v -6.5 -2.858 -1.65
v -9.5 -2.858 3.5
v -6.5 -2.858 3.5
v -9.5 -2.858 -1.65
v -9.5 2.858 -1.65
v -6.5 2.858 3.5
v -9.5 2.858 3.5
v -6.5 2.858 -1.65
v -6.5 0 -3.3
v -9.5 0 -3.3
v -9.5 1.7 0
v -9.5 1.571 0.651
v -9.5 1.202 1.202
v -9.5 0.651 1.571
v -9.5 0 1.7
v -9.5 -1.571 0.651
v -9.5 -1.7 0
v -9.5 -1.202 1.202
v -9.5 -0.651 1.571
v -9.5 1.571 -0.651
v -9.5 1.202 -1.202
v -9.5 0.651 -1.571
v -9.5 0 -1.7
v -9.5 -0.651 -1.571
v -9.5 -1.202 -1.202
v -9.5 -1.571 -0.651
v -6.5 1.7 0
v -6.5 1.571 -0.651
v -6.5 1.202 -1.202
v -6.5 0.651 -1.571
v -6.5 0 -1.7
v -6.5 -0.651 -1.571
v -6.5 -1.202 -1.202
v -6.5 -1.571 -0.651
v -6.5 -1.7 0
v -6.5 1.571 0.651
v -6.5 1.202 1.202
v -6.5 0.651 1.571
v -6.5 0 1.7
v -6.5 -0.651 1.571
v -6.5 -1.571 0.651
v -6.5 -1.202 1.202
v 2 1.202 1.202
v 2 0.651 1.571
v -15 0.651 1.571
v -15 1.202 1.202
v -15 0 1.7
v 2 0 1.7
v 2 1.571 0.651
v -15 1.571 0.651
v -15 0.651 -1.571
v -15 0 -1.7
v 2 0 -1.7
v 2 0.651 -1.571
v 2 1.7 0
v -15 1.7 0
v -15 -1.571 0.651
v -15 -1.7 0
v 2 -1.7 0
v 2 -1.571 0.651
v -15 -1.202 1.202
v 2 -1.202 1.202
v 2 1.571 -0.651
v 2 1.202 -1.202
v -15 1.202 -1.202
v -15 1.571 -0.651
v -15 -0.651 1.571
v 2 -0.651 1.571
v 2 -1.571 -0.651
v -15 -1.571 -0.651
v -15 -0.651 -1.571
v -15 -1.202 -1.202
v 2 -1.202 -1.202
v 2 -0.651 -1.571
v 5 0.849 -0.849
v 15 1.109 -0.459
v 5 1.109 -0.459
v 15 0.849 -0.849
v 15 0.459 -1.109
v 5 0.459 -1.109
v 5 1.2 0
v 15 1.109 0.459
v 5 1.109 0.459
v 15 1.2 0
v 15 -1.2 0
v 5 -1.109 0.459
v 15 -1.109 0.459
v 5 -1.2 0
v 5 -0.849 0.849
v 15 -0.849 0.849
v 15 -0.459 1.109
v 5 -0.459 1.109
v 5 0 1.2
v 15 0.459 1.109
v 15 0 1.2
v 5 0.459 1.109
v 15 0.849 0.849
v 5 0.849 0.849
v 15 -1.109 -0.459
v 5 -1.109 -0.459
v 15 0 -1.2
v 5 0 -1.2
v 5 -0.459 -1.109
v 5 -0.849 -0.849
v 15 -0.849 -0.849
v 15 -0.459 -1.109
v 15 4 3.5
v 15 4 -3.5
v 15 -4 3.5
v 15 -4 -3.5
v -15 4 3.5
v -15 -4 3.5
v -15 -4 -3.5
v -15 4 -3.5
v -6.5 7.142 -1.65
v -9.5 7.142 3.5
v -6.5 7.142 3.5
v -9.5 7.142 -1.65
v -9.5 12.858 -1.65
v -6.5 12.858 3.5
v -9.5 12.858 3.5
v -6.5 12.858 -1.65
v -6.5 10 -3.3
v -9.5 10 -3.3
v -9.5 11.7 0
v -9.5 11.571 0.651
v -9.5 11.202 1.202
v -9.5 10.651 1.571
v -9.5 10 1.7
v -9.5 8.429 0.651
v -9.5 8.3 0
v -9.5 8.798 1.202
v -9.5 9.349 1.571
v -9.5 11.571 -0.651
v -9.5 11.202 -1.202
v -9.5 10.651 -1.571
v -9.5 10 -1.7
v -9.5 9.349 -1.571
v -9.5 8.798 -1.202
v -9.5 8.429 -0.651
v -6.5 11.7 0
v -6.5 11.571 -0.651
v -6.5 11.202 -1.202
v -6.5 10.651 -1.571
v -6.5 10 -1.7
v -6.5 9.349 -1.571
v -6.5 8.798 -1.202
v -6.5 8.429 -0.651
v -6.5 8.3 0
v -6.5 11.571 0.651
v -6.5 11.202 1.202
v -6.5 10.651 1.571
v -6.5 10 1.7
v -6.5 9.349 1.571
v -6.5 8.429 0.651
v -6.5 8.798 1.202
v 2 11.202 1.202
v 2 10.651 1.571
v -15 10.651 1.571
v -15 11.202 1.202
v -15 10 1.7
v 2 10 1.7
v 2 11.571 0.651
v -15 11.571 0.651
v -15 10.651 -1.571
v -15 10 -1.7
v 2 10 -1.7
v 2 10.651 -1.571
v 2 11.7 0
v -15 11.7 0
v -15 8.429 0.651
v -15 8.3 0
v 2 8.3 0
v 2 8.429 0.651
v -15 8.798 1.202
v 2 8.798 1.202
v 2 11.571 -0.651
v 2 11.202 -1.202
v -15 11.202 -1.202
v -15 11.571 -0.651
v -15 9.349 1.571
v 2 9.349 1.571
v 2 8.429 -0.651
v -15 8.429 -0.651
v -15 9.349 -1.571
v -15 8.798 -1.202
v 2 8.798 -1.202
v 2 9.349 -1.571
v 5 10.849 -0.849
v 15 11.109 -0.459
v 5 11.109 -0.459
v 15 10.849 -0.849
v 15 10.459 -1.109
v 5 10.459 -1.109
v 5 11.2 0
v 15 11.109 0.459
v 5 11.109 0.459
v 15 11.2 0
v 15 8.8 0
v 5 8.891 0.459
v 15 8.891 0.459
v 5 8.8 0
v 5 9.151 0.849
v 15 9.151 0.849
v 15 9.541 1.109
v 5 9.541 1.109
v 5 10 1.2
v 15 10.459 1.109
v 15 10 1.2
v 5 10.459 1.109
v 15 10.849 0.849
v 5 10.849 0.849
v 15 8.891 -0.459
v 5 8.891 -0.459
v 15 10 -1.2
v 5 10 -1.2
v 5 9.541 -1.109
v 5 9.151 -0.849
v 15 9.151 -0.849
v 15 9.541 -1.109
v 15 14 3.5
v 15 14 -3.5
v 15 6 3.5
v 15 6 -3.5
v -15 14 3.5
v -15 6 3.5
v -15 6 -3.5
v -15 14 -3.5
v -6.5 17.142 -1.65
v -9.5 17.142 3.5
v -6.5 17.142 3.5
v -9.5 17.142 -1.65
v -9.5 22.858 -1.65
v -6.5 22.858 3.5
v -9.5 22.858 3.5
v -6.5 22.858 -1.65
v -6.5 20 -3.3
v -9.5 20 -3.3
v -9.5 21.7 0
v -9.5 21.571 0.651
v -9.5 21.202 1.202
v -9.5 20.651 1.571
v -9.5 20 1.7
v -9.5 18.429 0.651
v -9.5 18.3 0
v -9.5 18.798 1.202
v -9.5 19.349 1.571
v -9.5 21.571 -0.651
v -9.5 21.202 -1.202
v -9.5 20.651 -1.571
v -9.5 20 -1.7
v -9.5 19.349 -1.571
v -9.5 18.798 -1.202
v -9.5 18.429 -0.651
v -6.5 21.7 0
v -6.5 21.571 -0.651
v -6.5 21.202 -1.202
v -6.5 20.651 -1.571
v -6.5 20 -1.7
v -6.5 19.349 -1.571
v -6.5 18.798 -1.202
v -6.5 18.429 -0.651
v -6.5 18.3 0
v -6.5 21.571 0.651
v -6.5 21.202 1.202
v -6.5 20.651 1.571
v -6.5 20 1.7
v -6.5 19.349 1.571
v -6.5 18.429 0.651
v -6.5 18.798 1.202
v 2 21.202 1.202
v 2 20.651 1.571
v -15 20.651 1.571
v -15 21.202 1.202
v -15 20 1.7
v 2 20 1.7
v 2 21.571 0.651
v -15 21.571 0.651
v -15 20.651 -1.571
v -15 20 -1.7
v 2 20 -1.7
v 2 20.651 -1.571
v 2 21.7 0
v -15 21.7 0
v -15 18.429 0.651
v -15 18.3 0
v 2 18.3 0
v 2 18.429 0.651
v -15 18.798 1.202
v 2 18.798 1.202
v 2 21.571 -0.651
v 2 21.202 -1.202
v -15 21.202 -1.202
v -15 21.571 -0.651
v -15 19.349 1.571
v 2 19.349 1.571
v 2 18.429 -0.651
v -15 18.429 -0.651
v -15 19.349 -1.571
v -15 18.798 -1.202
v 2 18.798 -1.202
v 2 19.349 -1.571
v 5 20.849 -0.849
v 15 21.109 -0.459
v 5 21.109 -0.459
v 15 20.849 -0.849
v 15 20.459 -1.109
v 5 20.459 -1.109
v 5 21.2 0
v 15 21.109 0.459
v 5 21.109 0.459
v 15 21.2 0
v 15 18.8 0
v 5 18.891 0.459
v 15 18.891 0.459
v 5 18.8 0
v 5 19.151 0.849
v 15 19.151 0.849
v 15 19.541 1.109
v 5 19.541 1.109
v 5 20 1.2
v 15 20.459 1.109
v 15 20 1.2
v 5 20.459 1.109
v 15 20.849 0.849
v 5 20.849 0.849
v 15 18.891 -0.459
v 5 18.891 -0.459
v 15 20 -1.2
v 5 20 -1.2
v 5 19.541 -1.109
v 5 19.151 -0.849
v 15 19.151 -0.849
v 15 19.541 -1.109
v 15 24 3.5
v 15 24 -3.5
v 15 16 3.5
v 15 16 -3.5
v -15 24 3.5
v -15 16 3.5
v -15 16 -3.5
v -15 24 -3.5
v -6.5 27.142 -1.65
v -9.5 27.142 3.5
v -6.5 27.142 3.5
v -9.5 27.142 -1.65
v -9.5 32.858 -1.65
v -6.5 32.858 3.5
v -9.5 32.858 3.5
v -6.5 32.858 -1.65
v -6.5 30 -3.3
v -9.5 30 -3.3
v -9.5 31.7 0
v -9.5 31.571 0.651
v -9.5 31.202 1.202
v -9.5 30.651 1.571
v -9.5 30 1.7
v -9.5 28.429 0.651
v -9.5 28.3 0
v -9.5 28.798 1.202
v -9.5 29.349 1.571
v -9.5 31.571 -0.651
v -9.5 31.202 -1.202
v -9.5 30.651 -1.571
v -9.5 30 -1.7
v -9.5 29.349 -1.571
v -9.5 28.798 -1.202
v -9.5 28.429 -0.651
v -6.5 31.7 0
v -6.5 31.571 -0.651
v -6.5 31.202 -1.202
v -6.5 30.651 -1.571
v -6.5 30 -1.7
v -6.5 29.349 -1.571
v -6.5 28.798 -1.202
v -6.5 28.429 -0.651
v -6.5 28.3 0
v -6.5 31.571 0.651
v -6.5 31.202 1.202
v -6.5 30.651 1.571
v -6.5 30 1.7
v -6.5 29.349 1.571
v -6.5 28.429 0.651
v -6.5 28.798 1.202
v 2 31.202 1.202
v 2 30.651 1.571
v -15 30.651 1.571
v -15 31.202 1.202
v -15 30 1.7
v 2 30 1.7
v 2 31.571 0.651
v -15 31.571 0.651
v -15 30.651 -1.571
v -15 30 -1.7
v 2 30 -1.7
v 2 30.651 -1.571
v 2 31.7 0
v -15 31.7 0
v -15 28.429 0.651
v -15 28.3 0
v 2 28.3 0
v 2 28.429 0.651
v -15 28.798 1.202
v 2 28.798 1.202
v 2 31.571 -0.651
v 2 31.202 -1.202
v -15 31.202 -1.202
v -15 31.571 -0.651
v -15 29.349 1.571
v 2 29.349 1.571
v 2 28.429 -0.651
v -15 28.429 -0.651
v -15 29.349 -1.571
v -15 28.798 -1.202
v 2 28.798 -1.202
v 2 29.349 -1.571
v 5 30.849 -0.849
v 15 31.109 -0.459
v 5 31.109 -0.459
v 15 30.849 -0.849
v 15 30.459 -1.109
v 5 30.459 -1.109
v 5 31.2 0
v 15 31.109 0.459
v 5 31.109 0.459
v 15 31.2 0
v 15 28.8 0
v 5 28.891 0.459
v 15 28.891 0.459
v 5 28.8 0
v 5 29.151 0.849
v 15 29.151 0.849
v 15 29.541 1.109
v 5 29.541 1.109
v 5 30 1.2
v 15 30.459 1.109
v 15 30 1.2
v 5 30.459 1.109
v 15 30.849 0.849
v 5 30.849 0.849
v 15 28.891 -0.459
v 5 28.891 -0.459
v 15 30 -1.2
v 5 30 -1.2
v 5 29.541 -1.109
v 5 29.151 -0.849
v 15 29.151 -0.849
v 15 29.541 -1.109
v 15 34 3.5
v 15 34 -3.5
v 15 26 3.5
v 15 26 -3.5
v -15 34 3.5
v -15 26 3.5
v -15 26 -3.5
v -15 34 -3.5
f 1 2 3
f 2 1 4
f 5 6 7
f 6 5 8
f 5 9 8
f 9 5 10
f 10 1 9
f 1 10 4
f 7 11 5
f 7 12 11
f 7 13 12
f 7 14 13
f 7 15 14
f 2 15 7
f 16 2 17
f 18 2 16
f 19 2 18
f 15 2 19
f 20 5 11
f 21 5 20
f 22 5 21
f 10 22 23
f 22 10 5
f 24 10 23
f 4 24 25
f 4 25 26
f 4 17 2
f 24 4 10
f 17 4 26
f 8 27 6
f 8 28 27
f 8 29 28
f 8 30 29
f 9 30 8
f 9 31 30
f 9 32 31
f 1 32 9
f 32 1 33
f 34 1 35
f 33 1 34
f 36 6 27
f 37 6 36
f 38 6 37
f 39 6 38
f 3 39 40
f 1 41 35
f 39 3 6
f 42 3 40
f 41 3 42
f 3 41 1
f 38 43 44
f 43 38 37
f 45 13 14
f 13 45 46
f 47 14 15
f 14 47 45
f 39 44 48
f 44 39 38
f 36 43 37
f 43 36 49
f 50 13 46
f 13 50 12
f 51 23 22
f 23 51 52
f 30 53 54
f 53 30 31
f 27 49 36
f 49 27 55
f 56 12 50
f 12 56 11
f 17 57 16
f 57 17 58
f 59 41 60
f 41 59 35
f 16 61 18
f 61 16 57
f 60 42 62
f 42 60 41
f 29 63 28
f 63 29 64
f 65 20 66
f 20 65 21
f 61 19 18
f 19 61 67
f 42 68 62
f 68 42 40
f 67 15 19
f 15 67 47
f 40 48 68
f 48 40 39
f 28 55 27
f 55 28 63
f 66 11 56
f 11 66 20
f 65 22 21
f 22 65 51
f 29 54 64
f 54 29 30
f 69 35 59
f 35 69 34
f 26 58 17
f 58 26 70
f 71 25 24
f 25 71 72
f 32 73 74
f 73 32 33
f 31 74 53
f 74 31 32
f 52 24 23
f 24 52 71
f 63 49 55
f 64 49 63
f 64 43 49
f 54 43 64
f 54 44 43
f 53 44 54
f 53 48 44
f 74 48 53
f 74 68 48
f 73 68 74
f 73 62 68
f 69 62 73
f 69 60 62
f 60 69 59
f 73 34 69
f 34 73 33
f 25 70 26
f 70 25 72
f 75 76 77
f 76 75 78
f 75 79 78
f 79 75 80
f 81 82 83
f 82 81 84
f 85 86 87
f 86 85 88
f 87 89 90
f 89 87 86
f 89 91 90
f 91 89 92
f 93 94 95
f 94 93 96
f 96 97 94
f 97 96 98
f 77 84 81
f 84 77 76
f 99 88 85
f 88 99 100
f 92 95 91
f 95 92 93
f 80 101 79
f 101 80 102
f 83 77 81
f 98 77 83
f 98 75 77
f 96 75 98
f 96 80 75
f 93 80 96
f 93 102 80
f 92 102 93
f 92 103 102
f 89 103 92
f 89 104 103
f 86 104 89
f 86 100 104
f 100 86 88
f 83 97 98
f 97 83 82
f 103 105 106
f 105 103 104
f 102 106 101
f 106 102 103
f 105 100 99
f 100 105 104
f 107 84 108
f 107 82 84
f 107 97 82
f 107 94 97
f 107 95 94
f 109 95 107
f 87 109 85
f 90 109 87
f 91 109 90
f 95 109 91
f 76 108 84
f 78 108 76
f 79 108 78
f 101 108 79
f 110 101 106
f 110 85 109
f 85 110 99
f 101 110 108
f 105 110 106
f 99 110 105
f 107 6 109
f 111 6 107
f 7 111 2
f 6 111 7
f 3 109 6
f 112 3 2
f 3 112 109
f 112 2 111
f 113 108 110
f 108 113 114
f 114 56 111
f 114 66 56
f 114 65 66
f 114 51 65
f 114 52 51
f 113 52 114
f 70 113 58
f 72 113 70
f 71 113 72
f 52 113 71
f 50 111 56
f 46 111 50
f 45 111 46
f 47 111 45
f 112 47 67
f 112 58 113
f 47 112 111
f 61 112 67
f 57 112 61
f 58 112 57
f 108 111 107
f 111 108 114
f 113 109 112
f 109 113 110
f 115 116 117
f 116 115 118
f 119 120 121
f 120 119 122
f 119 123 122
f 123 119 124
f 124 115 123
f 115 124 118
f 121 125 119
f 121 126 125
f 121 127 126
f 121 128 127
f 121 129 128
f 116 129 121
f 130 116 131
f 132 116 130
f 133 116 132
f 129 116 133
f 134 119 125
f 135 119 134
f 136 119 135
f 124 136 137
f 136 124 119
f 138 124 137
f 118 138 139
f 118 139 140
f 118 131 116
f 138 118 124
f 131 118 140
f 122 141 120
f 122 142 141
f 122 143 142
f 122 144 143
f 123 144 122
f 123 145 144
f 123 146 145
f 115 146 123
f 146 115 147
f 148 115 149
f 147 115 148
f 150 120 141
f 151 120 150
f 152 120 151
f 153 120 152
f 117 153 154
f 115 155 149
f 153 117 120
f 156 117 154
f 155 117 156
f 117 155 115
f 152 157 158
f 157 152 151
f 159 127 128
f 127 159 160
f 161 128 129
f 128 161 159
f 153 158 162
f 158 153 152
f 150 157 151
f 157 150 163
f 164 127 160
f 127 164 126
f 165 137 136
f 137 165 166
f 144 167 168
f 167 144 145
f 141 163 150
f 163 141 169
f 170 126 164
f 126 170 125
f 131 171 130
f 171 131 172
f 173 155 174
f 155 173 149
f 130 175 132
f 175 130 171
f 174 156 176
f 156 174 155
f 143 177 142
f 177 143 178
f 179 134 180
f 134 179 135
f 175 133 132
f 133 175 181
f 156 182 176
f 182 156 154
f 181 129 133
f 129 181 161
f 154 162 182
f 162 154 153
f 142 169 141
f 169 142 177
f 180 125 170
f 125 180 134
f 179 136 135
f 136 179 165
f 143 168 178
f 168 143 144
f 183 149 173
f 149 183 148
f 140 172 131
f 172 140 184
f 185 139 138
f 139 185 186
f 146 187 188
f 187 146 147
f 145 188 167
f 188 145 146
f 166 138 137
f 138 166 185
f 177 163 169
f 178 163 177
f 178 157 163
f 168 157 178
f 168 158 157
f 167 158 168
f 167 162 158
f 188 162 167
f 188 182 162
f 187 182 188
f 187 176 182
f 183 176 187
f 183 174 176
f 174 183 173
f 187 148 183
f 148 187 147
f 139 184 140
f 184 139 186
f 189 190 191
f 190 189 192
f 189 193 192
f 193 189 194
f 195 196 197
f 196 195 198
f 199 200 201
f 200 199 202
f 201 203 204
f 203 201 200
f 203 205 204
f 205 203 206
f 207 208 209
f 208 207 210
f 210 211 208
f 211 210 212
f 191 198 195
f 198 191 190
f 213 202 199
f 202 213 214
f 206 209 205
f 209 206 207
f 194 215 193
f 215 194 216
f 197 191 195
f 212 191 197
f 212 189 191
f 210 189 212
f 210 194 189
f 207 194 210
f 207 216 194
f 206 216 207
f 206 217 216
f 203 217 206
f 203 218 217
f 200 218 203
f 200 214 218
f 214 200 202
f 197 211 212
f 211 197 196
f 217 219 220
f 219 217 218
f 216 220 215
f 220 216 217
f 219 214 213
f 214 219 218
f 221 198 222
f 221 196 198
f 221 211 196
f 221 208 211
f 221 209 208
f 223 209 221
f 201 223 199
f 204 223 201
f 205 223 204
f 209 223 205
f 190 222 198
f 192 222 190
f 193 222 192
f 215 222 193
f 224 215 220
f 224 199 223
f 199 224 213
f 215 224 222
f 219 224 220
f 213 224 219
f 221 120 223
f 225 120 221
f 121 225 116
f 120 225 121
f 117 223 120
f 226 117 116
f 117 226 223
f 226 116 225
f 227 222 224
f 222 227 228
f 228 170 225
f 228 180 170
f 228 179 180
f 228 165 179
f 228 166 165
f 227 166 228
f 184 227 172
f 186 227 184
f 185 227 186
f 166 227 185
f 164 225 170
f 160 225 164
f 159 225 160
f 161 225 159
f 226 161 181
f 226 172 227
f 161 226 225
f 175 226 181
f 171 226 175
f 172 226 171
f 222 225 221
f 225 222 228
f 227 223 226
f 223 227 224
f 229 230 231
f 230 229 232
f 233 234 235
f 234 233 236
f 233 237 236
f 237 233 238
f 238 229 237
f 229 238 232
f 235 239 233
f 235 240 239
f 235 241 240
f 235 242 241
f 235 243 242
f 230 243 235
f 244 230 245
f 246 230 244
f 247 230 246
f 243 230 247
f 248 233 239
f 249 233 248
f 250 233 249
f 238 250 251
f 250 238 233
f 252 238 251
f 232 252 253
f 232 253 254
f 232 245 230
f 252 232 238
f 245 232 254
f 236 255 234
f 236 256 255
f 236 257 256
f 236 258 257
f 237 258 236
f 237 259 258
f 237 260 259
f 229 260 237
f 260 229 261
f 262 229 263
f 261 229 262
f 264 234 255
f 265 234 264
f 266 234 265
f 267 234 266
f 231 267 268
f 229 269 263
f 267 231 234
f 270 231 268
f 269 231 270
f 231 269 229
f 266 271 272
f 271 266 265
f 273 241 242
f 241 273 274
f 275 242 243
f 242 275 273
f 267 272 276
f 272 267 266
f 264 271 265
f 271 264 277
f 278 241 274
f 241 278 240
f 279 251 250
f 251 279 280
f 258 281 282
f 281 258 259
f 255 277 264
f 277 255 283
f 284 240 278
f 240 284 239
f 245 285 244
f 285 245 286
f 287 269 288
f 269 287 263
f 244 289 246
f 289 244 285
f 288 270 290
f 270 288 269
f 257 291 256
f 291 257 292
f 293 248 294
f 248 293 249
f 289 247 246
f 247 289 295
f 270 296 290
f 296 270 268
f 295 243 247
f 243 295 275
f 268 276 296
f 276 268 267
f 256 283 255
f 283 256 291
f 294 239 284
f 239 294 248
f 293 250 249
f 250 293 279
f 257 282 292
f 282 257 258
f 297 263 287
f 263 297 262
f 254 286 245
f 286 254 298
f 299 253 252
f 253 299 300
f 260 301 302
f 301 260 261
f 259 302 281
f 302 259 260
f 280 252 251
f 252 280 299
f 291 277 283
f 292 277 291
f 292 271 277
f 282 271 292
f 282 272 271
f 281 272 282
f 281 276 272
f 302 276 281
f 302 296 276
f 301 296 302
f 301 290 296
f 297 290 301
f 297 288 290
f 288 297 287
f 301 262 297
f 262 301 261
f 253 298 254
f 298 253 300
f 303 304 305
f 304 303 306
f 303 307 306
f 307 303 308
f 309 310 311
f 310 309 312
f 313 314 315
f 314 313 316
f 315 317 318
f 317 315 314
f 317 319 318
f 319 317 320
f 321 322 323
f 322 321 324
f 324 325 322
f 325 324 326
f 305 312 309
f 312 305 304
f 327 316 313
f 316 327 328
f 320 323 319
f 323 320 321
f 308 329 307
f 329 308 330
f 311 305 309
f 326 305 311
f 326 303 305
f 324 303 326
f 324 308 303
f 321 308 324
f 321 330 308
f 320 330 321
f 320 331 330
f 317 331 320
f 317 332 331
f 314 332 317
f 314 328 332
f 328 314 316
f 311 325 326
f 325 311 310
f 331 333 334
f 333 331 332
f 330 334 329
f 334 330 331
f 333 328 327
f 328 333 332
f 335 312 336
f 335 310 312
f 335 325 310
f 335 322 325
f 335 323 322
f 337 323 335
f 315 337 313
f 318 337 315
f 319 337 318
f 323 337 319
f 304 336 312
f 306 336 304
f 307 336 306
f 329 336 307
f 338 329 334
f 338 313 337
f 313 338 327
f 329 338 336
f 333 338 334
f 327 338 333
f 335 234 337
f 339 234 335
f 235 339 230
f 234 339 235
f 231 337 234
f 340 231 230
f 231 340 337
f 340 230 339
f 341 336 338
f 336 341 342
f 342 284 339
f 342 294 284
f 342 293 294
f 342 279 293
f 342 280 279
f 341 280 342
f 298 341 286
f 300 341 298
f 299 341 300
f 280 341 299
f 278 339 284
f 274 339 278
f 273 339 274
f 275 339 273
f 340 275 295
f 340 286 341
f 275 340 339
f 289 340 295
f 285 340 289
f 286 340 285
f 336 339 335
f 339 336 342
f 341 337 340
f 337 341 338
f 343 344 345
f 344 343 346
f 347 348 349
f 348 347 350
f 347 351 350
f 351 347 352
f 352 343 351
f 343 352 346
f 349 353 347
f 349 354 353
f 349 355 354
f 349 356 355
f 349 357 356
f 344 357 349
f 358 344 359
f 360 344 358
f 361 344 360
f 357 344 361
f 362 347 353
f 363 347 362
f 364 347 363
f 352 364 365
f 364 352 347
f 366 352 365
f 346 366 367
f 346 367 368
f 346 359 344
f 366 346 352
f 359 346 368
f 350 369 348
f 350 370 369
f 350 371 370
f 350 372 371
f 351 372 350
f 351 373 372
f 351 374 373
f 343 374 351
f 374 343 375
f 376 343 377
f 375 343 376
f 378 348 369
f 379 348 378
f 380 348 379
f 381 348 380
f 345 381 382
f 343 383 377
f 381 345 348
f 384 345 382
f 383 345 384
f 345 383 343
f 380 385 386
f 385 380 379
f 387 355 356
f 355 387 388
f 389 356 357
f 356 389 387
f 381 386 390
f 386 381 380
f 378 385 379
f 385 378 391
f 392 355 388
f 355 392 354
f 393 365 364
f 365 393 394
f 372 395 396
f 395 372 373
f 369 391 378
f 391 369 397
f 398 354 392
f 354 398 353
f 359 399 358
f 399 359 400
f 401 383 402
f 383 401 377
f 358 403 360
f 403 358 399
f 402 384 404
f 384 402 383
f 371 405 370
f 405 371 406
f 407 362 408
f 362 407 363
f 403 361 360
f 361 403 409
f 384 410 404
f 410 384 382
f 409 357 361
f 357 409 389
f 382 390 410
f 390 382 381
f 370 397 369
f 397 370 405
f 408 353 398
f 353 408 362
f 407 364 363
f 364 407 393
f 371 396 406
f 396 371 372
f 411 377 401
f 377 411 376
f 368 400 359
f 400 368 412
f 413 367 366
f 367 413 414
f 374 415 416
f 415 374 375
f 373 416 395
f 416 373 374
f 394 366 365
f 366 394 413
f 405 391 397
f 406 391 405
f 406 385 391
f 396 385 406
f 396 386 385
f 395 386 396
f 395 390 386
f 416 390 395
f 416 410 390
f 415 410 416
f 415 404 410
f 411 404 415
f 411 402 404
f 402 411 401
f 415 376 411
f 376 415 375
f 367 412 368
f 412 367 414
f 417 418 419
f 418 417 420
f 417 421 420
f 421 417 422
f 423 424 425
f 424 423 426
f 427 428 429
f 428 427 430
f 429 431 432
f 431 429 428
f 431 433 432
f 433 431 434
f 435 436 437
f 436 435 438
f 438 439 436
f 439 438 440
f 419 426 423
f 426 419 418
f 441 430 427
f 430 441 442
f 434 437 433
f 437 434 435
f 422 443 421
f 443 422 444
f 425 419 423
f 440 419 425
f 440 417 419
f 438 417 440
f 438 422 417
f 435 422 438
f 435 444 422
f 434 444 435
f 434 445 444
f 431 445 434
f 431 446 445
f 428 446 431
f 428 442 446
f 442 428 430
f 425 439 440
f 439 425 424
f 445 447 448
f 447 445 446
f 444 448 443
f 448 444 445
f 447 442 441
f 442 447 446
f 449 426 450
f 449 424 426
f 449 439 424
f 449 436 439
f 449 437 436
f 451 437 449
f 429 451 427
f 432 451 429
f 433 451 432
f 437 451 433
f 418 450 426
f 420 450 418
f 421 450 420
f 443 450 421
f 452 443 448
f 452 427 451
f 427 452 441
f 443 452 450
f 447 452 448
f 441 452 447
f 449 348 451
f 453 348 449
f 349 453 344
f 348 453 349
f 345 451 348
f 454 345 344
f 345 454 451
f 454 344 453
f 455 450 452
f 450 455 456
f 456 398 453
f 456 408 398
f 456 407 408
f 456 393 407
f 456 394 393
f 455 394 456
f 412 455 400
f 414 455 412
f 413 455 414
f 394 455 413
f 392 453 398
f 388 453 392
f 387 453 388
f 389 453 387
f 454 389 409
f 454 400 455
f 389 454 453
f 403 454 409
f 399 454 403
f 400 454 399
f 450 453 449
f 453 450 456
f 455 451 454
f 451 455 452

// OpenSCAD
// file: ../../configuration.scad
/*
	Konfiguracni soubor 3D tiskarny RebeliX X2
	
	Sledujte nas na:		  
			www.RepRap4U.cz
			www.facebook.com/RebeliX.cz
			https://twitter.com/reprap4u
			https://plus.google.com/+Reprap4uCz-3Dtiskarna-RebeliX
*/

/*================ Slic3r nastaveni ==========================*/

// Vyska vrstvy pro tisknuti dilu [mm]
layer_height = 0.3;

// Sirka vytlacovaneho materialu [mm]
extrusion_width = 0.66; //Slic3r->Print Settings->Advanced->Default extrusion width

/*==================== M6 sroub ==============================*/

// Rezerva prumeru hlavy sroubu [mm]
space = 1;

// Prumer hlavy M6 sroubu (pricte se rezerva) [mm]
M6_head_diameter = 10.6+space;
//M6_head_diameter = 12+space;

// Prumer M6 sroubu
M6_dia = 6.3;

// Vyska hlavy M6 sroubu (dulezite pro zapusteni hlavy sroubu do plastu) [mm]
M6_head_height = 3.6;
//M6_head_height = 4.5;

// Delka sroubu M6 [mm]
// M6x12
M6_lenght = 12;

// Sirka matky do profilu (pokud neni pouzita, tak 0)
//profile_nut_width = 9.5;
profile_nut_width = 0;

/*=================== Nastaveni dilu =========================*/

// Posun Z zakladny
z_base_offset = 11;

// Posun Z motoru
z_motor_offset = 0;

// Tloustka rohovych spojek
// 5 mm => sroub M6x14 s podlozkou
// 3 mm => sroub M6x12 s podlozkou
coupler_thickness = 5;

// Prumer 8mm tyce
rod_8mm_d = 8.2;

// Posun drzacku mezi x-motor a x-end
x_holder_position = 6.5;

/*======================== Motory ============================*/

// Delka motoru (ovlivni dily a delky tyci pro osy Z a Y)
//SX17-1003LQFE (doporuceno hlavne na osu Z)
//motor_length = 29.5;
//SX17-1003 (doporuceno hlavne na osu Z), SX17-0503LQEF
motor_length = 34;
//SX17-1005
//motor_length = 40;
//SX17-0905 - zde je jiz problem s velkou vyskou motoru na ose Z - musi se upravit endstop-holder
//motor_length = 48;

/*================ Remeny a remenicky ========================*/

// GT2 
belt_tooth_distance = 2;
belt_tooth_ratio = 0.5;

// T2.5
//belt_tooth_distance = 2.5;
//belt_tooth_ratio = 0.68;
// main file
// RebeliX
//
// sloupek pro drzak elektroniky RUMBA
// GNU GPL v3
// Martin Neruda <neruda@reprap4u.cz>
// http://www.reprap4u.cz

include <../../configuration.scad>

length = 30;

module base()
{
  cube([length,8,7],center=true);
}

module cuts()
{
  translate([-length/2+7,0,0]) rotate([0,-90,0]) nut_hole();
  translate([length/2,0,0]) rotate([0,-90,0]) cylinder(r=2.4/2,h=20,$fn=16,center=true);
}

module nut_hole(nut_diameter=6.6)
{
	cylinder(r=nut_diameter/2,h=3,$fn=6,center=true);
    translate([15/2,0,0]) cube([15,nut_diameter*cos(30),3],center=true);
	translate([0,0,0]) cylinder(r=3.4/2,h=20,$fn=16,center=true);
}

module sloupek()
{
  difference()
  {
	base();
	cuts();
  }
}

for(i=[0:10:30])
{
  translate([0,i,0]) sloupek();
}
